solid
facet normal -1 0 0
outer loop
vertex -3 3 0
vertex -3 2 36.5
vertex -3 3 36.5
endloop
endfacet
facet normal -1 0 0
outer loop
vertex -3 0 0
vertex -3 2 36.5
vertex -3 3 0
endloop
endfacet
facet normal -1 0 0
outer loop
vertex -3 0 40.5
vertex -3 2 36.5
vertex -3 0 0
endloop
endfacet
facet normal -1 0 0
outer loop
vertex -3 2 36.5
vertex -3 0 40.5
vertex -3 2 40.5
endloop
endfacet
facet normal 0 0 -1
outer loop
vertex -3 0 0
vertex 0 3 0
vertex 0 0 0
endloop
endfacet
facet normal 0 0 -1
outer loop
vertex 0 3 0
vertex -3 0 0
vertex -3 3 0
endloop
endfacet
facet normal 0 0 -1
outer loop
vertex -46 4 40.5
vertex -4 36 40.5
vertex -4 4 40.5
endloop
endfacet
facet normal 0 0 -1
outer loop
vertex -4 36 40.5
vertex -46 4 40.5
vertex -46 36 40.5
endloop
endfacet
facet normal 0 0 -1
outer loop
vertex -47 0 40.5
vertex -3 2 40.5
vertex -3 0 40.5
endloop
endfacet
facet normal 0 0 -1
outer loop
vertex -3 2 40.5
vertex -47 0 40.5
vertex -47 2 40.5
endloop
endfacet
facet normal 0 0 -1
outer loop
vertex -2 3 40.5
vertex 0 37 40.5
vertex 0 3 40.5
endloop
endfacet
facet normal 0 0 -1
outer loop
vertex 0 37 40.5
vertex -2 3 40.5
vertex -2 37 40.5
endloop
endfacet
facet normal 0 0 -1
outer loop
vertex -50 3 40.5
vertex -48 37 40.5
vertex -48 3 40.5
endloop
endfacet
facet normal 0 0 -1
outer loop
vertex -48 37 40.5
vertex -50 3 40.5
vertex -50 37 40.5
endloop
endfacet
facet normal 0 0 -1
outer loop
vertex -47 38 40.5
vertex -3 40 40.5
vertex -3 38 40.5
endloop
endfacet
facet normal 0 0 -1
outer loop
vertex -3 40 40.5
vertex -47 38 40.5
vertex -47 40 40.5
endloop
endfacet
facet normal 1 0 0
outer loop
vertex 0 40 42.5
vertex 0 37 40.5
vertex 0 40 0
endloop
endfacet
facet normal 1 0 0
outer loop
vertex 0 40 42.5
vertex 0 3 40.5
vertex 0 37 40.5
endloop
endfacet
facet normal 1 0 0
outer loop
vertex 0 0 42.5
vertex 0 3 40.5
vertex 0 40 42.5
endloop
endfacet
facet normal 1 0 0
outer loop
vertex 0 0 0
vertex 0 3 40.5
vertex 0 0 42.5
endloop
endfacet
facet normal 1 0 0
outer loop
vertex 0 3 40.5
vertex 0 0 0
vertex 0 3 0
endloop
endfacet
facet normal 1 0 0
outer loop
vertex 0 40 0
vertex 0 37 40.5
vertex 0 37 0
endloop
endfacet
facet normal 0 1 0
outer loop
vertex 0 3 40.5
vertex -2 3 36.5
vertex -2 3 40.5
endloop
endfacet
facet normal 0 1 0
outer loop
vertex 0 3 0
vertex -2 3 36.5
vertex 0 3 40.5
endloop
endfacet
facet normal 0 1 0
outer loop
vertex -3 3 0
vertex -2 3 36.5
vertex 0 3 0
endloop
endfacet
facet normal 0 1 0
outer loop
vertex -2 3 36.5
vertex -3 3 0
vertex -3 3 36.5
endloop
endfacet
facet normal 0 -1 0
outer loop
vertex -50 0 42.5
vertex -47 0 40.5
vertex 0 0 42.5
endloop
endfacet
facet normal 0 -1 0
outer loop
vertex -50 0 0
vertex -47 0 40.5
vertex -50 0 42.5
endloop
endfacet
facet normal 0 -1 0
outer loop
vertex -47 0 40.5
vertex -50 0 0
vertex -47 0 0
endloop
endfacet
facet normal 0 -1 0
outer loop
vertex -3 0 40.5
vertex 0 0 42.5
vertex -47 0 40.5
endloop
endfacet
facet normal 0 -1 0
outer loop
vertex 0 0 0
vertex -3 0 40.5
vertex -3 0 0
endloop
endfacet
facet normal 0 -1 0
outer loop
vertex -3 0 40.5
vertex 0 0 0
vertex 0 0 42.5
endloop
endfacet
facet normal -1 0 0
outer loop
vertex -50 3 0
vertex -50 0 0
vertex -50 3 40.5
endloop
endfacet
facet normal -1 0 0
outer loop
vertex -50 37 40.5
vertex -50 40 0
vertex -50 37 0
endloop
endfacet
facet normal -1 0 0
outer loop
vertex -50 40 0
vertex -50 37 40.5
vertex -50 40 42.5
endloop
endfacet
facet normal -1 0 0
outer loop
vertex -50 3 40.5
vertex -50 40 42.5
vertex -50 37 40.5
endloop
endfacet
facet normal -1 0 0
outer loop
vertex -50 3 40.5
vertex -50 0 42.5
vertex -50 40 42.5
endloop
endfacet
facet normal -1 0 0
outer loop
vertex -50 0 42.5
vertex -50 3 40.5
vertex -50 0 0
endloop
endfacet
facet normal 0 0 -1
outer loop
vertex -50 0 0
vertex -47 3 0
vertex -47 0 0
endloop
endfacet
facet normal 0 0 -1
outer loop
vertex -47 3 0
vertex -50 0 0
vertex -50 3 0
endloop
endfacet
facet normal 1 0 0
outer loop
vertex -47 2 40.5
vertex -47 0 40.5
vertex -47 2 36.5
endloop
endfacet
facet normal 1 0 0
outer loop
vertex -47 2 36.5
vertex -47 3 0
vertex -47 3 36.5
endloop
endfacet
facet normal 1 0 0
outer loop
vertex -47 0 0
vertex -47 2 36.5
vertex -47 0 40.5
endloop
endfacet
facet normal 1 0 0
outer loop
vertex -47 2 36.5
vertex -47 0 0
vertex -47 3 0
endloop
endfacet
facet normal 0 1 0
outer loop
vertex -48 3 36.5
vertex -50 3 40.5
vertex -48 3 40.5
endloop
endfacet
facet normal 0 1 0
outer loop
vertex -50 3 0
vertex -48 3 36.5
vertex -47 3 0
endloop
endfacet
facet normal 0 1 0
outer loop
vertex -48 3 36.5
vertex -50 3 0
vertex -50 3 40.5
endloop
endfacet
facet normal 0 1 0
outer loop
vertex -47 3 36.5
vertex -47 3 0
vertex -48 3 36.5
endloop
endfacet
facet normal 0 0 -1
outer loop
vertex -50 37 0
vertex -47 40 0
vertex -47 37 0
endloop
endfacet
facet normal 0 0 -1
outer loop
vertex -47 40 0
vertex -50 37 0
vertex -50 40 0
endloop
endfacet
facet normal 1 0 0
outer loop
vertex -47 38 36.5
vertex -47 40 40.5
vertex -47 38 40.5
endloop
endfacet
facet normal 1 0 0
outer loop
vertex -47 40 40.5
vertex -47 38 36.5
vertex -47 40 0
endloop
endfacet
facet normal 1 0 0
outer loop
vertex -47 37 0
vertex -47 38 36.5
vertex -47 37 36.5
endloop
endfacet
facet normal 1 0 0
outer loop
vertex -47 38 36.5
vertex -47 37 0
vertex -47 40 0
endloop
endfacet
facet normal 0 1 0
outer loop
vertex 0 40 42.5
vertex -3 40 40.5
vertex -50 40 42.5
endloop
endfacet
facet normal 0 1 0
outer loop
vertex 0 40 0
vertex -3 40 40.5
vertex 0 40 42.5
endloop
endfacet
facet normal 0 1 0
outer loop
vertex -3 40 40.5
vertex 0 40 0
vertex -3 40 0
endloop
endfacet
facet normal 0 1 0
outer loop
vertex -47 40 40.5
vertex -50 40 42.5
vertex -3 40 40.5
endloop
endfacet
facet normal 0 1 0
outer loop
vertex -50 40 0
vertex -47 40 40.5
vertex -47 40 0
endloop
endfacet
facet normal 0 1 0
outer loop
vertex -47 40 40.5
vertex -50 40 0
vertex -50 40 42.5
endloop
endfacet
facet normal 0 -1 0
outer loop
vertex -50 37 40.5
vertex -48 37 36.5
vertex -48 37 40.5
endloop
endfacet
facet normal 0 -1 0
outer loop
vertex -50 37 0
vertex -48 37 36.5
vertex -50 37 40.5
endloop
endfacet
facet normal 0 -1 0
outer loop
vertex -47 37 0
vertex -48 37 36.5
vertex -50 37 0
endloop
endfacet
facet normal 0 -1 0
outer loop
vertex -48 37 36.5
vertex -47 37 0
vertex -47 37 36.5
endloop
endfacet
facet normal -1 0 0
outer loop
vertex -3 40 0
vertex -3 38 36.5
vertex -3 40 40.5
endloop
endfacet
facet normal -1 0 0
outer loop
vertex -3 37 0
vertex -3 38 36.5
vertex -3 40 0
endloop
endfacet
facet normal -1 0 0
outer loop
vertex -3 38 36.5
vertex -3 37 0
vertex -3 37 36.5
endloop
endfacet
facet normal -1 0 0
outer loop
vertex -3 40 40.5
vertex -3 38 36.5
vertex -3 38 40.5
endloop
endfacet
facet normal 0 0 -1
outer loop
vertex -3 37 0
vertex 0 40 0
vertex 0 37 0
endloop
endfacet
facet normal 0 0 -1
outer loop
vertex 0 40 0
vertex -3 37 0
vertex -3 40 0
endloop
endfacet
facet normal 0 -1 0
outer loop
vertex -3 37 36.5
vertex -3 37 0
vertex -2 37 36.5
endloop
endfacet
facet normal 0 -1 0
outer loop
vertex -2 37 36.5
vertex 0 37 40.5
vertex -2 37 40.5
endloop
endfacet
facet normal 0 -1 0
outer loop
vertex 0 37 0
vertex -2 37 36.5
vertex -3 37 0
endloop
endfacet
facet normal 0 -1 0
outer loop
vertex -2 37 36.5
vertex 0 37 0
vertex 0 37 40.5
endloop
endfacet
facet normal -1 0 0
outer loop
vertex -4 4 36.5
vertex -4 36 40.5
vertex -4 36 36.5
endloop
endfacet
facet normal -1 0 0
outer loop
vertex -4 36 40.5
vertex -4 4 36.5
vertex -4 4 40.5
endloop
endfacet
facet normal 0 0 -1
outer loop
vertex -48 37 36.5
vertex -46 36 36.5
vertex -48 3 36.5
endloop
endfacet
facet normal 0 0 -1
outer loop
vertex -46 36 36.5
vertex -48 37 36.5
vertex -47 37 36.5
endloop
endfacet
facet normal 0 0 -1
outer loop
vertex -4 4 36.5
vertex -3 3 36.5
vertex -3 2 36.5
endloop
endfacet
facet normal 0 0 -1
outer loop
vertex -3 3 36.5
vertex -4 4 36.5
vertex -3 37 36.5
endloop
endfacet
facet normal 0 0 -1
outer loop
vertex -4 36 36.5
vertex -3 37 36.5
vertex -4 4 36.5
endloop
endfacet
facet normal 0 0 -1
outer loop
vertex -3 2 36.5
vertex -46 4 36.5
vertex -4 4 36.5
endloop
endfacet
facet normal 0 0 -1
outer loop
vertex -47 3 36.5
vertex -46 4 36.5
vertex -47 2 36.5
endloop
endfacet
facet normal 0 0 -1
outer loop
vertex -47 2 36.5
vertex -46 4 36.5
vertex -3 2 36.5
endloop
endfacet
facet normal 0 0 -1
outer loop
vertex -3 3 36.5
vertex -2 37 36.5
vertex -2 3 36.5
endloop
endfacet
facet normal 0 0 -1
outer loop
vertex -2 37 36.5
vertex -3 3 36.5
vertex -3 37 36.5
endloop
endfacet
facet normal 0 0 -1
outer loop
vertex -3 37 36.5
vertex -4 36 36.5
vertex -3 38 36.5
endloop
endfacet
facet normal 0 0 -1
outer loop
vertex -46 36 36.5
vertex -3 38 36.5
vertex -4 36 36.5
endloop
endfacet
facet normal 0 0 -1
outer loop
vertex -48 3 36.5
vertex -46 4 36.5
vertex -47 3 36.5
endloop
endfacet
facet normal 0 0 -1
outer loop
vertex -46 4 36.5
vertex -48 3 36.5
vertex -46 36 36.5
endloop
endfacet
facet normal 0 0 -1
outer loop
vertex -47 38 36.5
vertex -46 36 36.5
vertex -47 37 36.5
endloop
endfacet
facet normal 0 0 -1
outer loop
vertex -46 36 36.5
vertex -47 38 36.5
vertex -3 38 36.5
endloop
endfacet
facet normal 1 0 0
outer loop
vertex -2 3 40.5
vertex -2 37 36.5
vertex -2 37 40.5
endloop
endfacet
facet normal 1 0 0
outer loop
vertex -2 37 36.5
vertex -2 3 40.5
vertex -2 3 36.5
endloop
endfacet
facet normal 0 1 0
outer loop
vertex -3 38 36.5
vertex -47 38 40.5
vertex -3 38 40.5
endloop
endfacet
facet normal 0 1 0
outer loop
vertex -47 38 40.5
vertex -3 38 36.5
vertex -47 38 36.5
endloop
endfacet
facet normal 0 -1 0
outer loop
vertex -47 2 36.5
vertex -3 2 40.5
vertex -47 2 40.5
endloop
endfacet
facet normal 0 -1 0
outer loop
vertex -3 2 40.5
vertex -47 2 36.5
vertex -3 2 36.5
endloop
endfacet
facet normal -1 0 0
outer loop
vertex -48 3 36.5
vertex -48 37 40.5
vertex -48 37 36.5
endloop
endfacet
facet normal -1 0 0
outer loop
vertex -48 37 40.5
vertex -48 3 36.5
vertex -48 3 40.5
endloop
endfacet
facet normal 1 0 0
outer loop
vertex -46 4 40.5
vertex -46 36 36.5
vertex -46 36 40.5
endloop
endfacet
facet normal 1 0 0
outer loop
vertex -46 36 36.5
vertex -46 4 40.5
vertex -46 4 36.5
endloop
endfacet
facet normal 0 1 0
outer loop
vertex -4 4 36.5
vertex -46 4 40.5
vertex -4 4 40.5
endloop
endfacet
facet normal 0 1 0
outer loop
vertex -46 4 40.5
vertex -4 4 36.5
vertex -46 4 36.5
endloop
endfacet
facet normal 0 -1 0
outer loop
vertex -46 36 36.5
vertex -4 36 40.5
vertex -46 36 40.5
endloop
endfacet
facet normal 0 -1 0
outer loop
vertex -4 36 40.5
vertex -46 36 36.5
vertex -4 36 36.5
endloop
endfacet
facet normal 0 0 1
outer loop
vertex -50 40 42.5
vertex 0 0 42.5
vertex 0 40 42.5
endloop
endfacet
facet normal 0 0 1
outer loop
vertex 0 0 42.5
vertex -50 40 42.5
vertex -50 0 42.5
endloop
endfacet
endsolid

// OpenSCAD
/* [Hidden] */
offset = 0.5;

/* [Colours] */
//Table Top Color
top_colour = "SaddleBrown";
//Table Top Color
leg_colour = "SaddleBrown";
//Table Top Color
skirt_colour = "SaddleBrown";

/* [Table] */
//Table Length (mm)
top_x = 50;
//Table Width (mm)
top_y = 40;
//Table Top Thickness (mm)
top_z = 2;

/* [Legs] */
//Leg Width (mm)
leg_x = 3;
//Leg Depth (mm)
leg_y = 3;
//Leg Height (mm)
leg_z = 40;

/* [Skirt] */
//Skirt Thickness (mm)
skirt_x = 2;
//Skirt Offset from Edge (mm)
skirt_top_offset = 2;
//Skirt Height (mm)
skirt_z = 4;
union() {
    translate([0,0,leg_z + top_z + offset]) {
        rotate([0,180,0]) {
            top();
            legs();
            fullSkirt();
        }
    }
}
module fullSkirt() {
    //skirt y.1
    translate([skirt_top_offset, skirt_top_offset, top_z-offset]) {
        skirt(top_y);
    }

    //skirt y.2
    translate([top_x - skirt_x - skirt_top_offset, skirt_top_offset, top_z-offset]) {
        skirt(top_y);
    }

    //skirt x.1
    translate([top_x - skirt_top_offset, skirt_top_offset, top_z-offset]) {
        rotate([0,0,90]) {
            skirt(top_x);
        }
    }

    //skirt x.2
    translate([top_x - skirt_top_offset, top_y - skirt_top_offset - skirt_x, top_z-offset]) {
        rotate([0,0,90]) {
            skirt(top_x);
        }
    }
}
module legs() {
    //leg 1
    translate([0,0,top_z]) {
        leg();
    }

    //leg 2
    translate([(top_x-leg_x),0,top_z]) {
        leg();
    }

    //leg 3
    translate([(top_x-leg_x),(top_y-leg_y),top_z]) {
        leg();
    }

    //leg 4
    translate([0,(top_y - leg_y),top_z]) {
        leg();
    }
}
module leg() {
    color (leg_colour, 1.0) {
        cube ([leg_x,leg_y,leg_z + offset], false);
    }
}
module skirt(width) {
    color (skirt_colour, 1.0) {
        cube ([skirt_x, width-(skirt_top_offset * 2), skirt_z + offset], false);
    }
}
module top() {
    color (top_colour, 1.0) {
        cube ([top_x,top_y,top_z], false);
    }
}
